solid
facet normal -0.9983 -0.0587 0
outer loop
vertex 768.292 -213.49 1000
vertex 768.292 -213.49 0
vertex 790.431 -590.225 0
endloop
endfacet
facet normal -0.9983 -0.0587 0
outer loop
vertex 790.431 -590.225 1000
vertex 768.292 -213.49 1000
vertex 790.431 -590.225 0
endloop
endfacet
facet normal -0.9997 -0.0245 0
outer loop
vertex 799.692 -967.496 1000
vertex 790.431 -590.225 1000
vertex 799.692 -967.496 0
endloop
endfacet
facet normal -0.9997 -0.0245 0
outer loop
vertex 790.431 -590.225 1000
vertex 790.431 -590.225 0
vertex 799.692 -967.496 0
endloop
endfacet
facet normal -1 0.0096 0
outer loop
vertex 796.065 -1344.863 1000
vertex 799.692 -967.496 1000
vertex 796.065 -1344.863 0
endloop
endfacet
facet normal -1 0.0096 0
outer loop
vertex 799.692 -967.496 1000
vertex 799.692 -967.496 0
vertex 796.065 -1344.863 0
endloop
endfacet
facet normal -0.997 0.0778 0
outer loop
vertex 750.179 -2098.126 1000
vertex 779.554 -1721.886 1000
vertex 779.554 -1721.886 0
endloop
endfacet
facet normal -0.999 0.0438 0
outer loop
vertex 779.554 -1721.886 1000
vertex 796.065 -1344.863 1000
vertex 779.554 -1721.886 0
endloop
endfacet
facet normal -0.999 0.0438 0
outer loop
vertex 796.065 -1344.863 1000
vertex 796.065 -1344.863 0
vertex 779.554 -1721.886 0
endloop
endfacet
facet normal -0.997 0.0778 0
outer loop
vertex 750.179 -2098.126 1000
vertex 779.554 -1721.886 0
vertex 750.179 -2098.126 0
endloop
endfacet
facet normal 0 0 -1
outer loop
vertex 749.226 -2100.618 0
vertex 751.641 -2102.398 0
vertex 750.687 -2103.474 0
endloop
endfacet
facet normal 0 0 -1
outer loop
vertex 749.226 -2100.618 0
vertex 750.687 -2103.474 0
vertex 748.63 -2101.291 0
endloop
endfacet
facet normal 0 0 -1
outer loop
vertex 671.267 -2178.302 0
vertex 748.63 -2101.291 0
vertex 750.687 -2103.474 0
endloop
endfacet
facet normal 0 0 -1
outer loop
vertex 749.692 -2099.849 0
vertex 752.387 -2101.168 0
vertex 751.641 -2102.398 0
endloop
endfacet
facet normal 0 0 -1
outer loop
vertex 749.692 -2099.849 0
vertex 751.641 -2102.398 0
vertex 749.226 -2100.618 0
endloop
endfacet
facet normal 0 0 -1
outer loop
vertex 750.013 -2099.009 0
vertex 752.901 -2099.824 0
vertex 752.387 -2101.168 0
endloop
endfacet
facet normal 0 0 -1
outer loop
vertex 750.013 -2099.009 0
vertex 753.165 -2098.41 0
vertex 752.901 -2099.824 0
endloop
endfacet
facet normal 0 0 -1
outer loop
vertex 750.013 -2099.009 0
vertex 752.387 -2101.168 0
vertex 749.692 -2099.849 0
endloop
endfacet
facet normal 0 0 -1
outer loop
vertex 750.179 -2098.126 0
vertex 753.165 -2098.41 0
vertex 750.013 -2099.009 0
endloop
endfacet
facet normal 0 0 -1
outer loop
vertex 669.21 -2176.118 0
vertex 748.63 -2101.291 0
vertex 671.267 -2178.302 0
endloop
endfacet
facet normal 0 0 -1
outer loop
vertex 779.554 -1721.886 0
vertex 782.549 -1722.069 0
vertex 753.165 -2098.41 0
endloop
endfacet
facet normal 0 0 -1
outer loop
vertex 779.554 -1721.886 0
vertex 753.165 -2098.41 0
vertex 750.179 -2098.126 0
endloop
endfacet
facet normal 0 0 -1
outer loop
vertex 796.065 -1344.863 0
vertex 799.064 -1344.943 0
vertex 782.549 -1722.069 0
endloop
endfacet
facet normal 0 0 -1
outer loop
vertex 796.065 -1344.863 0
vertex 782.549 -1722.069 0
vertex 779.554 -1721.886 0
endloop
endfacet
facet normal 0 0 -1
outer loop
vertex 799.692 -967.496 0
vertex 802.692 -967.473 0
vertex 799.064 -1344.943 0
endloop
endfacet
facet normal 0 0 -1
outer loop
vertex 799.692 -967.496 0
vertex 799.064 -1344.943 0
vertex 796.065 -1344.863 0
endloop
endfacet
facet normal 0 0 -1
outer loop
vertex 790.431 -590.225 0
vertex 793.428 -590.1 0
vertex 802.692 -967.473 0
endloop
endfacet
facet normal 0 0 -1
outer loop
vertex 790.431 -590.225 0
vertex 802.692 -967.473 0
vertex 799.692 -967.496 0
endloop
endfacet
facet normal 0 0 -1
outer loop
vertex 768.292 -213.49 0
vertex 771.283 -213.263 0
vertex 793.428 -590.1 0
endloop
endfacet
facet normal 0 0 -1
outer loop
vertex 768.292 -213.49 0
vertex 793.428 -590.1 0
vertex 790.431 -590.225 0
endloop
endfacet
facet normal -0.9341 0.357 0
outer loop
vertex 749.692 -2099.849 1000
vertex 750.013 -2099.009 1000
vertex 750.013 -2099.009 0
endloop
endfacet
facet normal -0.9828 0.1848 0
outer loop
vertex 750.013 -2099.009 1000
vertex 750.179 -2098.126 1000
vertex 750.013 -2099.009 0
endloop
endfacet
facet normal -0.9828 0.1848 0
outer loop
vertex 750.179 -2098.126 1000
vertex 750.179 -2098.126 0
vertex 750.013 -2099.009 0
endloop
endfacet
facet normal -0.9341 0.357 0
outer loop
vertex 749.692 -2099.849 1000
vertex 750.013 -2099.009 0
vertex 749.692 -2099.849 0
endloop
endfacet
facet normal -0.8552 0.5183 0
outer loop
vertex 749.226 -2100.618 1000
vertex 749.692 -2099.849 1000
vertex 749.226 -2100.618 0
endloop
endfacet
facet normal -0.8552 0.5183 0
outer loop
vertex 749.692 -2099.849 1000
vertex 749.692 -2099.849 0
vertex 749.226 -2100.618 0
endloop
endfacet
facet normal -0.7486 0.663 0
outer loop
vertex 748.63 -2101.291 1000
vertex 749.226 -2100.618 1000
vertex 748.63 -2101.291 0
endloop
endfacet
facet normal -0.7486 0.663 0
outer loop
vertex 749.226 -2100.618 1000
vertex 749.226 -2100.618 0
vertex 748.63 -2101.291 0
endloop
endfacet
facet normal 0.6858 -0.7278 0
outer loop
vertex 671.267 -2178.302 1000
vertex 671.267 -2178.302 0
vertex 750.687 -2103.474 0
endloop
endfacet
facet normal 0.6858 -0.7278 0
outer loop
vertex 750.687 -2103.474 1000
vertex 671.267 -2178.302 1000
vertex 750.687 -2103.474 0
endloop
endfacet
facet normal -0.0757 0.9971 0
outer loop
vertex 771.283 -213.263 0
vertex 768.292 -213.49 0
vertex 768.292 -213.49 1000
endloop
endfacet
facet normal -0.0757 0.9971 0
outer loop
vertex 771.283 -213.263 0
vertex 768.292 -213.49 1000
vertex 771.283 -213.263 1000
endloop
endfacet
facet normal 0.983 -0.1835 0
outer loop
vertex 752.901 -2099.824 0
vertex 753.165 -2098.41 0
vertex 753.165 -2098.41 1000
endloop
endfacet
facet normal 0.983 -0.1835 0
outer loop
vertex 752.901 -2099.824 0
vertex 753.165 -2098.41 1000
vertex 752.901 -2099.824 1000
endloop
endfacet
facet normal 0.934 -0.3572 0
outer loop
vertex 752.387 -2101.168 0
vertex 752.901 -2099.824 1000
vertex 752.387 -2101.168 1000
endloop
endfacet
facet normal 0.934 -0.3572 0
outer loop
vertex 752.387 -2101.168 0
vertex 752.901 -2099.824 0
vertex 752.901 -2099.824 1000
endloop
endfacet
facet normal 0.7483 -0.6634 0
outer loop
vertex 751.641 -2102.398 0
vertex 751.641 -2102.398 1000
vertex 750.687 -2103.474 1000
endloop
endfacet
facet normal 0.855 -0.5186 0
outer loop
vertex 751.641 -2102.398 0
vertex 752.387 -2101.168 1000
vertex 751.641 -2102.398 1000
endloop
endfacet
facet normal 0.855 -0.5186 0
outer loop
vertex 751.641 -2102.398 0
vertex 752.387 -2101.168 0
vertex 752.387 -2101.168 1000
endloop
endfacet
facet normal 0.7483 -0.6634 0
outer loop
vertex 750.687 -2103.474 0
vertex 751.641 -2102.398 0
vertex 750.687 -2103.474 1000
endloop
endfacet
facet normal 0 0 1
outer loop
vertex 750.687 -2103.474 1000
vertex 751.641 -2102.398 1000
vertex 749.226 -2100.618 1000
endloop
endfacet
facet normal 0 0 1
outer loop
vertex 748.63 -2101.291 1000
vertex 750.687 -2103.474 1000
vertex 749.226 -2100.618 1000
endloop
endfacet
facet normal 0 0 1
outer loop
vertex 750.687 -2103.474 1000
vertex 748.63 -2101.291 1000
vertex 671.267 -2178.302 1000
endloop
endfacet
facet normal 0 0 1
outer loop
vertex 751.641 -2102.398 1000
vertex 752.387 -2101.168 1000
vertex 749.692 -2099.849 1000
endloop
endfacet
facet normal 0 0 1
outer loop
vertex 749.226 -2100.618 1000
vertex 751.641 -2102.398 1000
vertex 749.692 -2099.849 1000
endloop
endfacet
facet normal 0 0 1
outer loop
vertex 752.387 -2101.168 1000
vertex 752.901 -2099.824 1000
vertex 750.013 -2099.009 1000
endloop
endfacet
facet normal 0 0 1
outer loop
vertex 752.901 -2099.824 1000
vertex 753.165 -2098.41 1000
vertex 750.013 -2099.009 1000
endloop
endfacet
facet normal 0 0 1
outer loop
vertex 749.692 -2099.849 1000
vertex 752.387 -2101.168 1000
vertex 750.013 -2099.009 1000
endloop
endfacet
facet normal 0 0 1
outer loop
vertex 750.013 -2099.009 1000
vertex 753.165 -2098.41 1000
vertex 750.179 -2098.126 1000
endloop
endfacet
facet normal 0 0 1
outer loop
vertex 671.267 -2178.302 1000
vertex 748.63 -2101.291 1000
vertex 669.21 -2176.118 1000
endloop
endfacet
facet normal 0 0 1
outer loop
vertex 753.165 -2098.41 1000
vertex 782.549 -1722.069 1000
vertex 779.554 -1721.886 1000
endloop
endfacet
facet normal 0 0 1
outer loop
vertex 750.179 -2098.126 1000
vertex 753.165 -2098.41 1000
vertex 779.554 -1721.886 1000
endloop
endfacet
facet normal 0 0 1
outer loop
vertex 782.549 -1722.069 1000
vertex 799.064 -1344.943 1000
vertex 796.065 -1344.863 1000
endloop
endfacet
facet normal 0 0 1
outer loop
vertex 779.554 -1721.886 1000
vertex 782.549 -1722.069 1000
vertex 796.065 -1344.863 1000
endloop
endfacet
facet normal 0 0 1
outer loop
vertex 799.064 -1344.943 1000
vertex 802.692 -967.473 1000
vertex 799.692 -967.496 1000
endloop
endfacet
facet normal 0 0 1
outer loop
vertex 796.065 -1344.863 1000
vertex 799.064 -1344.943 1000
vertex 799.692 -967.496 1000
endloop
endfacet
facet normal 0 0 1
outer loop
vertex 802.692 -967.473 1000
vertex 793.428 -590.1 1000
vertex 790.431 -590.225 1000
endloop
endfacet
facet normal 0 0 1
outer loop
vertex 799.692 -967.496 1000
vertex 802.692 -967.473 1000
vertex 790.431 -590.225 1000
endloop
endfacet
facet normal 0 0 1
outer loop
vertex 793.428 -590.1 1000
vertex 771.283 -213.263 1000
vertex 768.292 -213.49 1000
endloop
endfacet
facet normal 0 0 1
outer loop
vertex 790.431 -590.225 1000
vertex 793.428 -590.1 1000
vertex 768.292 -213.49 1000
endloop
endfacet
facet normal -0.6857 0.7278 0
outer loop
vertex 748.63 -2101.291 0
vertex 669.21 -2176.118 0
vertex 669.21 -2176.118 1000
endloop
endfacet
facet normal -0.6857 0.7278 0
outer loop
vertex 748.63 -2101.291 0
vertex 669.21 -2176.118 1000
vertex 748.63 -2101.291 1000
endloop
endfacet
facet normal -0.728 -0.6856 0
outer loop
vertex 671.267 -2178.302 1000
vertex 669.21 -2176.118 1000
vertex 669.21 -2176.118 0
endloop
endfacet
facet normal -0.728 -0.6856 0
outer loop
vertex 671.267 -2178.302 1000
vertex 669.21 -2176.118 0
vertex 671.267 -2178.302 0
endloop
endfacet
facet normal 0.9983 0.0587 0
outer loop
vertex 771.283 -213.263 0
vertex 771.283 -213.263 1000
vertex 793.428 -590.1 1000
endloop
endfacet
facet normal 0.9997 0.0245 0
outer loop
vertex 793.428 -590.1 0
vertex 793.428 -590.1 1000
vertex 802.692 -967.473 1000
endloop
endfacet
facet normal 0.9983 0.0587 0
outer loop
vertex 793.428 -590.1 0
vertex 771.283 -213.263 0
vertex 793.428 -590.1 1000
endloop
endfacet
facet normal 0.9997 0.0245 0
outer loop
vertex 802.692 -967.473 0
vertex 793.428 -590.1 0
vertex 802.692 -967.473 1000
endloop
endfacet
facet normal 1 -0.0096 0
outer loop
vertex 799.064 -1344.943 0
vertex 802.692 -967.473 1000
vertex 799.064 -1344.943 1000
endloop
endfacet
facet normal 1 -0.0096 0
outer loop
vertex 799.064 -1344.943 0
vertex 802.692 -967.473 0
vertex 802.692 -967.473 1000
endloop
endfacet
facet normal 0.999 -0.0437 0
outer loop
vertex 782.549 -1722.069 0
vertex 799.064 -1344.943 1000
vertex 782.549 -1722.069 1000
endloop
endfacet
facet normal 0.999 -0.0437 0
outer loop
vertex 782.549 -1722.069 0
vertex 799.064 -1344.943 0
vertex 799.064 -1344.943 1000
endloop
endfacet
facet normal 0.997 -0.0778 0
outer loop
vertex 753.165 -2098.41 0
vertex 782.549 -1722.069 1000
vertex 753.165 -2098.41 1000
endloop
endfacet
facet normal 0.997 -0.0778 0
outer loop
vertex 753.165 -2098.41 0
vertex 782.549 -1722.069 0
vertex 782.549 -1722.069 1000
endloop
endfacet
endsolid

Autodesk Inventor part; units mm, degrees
ref_plane "YZ Plane" through (0, 0, 0) normal (1, 0, 0) x (0, 1, 0)
ref_plane "XZ Plane" through (0, 0, 0) normal (0, 1, 0) x (-1, 0, 0)
ref_plane "XY Plane" through (0, 0, 0) normal (0, 0, 1) x (1, 0, 0)
sketch "Sketch1" plane through (0, 0, 0) normal (0, 0, 1) x (1, 0, 0)
  line L0 (-750, 0) -> (750, 0) construction
  line L1 (750, 0) -> (750, -2700) construction
  line L2 (750, -2700) -> (-750, -2700) construction
  line L3 (-750, -2700) -> (-750, 0) construction
  line L4 (800, 50) -> (-800, 50) construction
  line L5 (-800, 50) -> (-800, -2750) construction
  line L6 (-800, -2750) -> (800, -2750) construction
  line L7 (800, -2750) -> (800, 50) construction
  line L8 (-850, 100) -> (850, 100) construction
  line L9 (850, 100) -> (850, -2800) construction
  line L10 (850, -2800) -> (-850, -2800) construction
  line L11 (-850, -2800) -> (-850, 100) construction
  arc A0 (750, 0) -> (743.691501, 0.841272) centre (0, -5600) ccw construction
  line L12 (-750, -2100) -> (750, -2100) construction
  line L13 (115.485997, -2697.8227) -> (669.21004, -2176.118213) construction
  arc A1 (750, -2100) -> (750.178737, -2098.125829) centre (-10250, -1050) ccw construction
  line L14 (750, 0) -> (749.60177, -2.973451) construction
  arc A2 (750, -3.026786) -> (0, 47) centre (-0.2, -5602.999996) ccw construction
  line L15 (750, 0) -> (747.013575, -0.285068) construction
  arc A3 (767.164125, -238.640862) -> (747.4657, -5.032602) centre (-10252.989512, -1050.252733) ccw construction
  arc A4 (750.602724, -6.333527) -> (743.691501, 0.841272) centre (742.638487, -7.089123) ccw construction
  arc A5 (747.4657, -5.032602) -> (744.874766, -2.342571) centre (744.479152, -5.316372) ccw construction
  line L16 (750, -2100) -> (752.986425, -2100.285068) construction
  arc A6 (752.986425, -2100.285068) -> (771.283058, -213.26303) centre (-10246.989147, -1050.029193) ccw construction
  line L17 (750, -2100) -> (752.057249, -2102.183512) construction
  line L18 (752.05726, -2102.183502) -> (752.057249, -2102.183512) construction
  arc A7 (748.630029, -2101.290751) -> (750.178737, -2098.125829) centre (745.201281, -2097.651564) ccw
  line L19 (0, -2697) -> (110.793766, -2697) construction
  line L20 (112.851015, -2696.183512) -> (685.348728, -2156.790959) construction
  arc A8 (110, -2700) -> (115.485997, -2697.8227) centre (110, -2692) ccw construction
  arc A9 (110.793766, -2697) -> (112.851015, -2696.183512) centre (110.793766, -2694) ccw construction
  line L21 (685.348728, -2156.790959) -> (687.405977, -2158.974471) construction
  line L22 (752.05726, -2102.183502) -> (671.267289, -2178.301725) construction
  line L23 (671.267289, -2178.301725) -> (669.21004, -2176.118213) construction
  arc A10 (747.4657, -5.032602) -> (747.013575, -0.285068) centre (-10252.989512, -1050.252733) ccw construction
  arc A11 (743.691501, 0.841272) -> (0, 50) centre (0, -5600) ccw construction
  arc A12 (750.602724, -6.333527) -> (750, 0) centre (-10250, -1050) ccw construction
  line L24 (770.156022, -238.420524) -> (767.164125, -238.640862) construction
  line L25 (768.291667, -213.490137) -> (771.283058, -213.26303) construction
  arc A13 (768.291667, -213.490137) -> (750.602724, -6.333527) centre (-10250, -1050) ccw construction
  line L26 (0, 100) -> (0, 50) construction
  line L27 (0, -2700) -> (0, -2697) construction
  line L28 (0, 47) -> (0, 0) construction
  line L29 (0, 50) -> (0, 47) construction
  arc A14 (752.057249, -2102.183512) -> (752.986425, -2100.285068) centre (749.999822, -2099.999913) ccw construction
  line L30 (669.21004, -2176.118213) -> (748.630029, -2101.290751)
  arc A15 (750.178737, -2098.125829) -> (768.291667, -213.490137) centre (-10250, -1050) ccw
  line L31 (748.630029, -2101.290751) -> (750, -2100) construction
  point P0 (0, -2750)
  dimension "d54" = 1500
  dimension "d55" = 2700
  dimension "d58" = 2100
  dimension "d68" = 8
  dimension "d70" = 3
  dimension "d75" = 5
  dimension "d83" = 8
  dimension "d86" = 3
  dimension "d112" = 239.271
  dimension "d113" = 50
  dimension "d114" = 50
  dimension "d115" = 3
  dimension "d116" = 25
  dimension "d117" = 110
  dimension "d118" = 25
  dimension "d119" = 111
contour flange "Contour Flange2" sketch "Sketch1" thickness 3 bend radius 5 width 1000 along (0, 0, 1) mid plane no both sides no wall seen from (708.920034, -2138.704482, 0) lies toward (0.6857497, -0.7278375, 0) curves L30 A7 A15
bend "Bend2"
corner "Corner2"
equation "\"d36\" = Thickness"
equation "\"d37\" = BendReliefWidth"
equation "\"d38\" = BendReliefDepth"
equation "\"d39\" = MinimumRemnant"
equation "\"d40\" = TransitionRadius"
equation "\"d42\" = BendRadius"
equation "\"d44\" = CornerReliefSize"
equation "\"d45\" = GapSize"
equation "\"d46\" = JacobiRadiusSize"
equation "\"BendReliefWidth\" = Thickness"
equation "\"BendReliefDepth\" = 0.5 * Thickness"
equation "\"CornerReliefSize\" = 4 * Thickness"
equation "\"MinimumRemnant\" = 2 * Thickness"
equation "\"GapSize\" = Thickness"
equation "\"Thickness\" = 3"
equation "\"TransitionRadius\" = 5"
equation "\"BendRadius\" = 5"
equation "\"JacobiRadiusSize\" = 5"
properties part number "МОО 024 лист борт основной" material "Stainless Steel AISI 304"
